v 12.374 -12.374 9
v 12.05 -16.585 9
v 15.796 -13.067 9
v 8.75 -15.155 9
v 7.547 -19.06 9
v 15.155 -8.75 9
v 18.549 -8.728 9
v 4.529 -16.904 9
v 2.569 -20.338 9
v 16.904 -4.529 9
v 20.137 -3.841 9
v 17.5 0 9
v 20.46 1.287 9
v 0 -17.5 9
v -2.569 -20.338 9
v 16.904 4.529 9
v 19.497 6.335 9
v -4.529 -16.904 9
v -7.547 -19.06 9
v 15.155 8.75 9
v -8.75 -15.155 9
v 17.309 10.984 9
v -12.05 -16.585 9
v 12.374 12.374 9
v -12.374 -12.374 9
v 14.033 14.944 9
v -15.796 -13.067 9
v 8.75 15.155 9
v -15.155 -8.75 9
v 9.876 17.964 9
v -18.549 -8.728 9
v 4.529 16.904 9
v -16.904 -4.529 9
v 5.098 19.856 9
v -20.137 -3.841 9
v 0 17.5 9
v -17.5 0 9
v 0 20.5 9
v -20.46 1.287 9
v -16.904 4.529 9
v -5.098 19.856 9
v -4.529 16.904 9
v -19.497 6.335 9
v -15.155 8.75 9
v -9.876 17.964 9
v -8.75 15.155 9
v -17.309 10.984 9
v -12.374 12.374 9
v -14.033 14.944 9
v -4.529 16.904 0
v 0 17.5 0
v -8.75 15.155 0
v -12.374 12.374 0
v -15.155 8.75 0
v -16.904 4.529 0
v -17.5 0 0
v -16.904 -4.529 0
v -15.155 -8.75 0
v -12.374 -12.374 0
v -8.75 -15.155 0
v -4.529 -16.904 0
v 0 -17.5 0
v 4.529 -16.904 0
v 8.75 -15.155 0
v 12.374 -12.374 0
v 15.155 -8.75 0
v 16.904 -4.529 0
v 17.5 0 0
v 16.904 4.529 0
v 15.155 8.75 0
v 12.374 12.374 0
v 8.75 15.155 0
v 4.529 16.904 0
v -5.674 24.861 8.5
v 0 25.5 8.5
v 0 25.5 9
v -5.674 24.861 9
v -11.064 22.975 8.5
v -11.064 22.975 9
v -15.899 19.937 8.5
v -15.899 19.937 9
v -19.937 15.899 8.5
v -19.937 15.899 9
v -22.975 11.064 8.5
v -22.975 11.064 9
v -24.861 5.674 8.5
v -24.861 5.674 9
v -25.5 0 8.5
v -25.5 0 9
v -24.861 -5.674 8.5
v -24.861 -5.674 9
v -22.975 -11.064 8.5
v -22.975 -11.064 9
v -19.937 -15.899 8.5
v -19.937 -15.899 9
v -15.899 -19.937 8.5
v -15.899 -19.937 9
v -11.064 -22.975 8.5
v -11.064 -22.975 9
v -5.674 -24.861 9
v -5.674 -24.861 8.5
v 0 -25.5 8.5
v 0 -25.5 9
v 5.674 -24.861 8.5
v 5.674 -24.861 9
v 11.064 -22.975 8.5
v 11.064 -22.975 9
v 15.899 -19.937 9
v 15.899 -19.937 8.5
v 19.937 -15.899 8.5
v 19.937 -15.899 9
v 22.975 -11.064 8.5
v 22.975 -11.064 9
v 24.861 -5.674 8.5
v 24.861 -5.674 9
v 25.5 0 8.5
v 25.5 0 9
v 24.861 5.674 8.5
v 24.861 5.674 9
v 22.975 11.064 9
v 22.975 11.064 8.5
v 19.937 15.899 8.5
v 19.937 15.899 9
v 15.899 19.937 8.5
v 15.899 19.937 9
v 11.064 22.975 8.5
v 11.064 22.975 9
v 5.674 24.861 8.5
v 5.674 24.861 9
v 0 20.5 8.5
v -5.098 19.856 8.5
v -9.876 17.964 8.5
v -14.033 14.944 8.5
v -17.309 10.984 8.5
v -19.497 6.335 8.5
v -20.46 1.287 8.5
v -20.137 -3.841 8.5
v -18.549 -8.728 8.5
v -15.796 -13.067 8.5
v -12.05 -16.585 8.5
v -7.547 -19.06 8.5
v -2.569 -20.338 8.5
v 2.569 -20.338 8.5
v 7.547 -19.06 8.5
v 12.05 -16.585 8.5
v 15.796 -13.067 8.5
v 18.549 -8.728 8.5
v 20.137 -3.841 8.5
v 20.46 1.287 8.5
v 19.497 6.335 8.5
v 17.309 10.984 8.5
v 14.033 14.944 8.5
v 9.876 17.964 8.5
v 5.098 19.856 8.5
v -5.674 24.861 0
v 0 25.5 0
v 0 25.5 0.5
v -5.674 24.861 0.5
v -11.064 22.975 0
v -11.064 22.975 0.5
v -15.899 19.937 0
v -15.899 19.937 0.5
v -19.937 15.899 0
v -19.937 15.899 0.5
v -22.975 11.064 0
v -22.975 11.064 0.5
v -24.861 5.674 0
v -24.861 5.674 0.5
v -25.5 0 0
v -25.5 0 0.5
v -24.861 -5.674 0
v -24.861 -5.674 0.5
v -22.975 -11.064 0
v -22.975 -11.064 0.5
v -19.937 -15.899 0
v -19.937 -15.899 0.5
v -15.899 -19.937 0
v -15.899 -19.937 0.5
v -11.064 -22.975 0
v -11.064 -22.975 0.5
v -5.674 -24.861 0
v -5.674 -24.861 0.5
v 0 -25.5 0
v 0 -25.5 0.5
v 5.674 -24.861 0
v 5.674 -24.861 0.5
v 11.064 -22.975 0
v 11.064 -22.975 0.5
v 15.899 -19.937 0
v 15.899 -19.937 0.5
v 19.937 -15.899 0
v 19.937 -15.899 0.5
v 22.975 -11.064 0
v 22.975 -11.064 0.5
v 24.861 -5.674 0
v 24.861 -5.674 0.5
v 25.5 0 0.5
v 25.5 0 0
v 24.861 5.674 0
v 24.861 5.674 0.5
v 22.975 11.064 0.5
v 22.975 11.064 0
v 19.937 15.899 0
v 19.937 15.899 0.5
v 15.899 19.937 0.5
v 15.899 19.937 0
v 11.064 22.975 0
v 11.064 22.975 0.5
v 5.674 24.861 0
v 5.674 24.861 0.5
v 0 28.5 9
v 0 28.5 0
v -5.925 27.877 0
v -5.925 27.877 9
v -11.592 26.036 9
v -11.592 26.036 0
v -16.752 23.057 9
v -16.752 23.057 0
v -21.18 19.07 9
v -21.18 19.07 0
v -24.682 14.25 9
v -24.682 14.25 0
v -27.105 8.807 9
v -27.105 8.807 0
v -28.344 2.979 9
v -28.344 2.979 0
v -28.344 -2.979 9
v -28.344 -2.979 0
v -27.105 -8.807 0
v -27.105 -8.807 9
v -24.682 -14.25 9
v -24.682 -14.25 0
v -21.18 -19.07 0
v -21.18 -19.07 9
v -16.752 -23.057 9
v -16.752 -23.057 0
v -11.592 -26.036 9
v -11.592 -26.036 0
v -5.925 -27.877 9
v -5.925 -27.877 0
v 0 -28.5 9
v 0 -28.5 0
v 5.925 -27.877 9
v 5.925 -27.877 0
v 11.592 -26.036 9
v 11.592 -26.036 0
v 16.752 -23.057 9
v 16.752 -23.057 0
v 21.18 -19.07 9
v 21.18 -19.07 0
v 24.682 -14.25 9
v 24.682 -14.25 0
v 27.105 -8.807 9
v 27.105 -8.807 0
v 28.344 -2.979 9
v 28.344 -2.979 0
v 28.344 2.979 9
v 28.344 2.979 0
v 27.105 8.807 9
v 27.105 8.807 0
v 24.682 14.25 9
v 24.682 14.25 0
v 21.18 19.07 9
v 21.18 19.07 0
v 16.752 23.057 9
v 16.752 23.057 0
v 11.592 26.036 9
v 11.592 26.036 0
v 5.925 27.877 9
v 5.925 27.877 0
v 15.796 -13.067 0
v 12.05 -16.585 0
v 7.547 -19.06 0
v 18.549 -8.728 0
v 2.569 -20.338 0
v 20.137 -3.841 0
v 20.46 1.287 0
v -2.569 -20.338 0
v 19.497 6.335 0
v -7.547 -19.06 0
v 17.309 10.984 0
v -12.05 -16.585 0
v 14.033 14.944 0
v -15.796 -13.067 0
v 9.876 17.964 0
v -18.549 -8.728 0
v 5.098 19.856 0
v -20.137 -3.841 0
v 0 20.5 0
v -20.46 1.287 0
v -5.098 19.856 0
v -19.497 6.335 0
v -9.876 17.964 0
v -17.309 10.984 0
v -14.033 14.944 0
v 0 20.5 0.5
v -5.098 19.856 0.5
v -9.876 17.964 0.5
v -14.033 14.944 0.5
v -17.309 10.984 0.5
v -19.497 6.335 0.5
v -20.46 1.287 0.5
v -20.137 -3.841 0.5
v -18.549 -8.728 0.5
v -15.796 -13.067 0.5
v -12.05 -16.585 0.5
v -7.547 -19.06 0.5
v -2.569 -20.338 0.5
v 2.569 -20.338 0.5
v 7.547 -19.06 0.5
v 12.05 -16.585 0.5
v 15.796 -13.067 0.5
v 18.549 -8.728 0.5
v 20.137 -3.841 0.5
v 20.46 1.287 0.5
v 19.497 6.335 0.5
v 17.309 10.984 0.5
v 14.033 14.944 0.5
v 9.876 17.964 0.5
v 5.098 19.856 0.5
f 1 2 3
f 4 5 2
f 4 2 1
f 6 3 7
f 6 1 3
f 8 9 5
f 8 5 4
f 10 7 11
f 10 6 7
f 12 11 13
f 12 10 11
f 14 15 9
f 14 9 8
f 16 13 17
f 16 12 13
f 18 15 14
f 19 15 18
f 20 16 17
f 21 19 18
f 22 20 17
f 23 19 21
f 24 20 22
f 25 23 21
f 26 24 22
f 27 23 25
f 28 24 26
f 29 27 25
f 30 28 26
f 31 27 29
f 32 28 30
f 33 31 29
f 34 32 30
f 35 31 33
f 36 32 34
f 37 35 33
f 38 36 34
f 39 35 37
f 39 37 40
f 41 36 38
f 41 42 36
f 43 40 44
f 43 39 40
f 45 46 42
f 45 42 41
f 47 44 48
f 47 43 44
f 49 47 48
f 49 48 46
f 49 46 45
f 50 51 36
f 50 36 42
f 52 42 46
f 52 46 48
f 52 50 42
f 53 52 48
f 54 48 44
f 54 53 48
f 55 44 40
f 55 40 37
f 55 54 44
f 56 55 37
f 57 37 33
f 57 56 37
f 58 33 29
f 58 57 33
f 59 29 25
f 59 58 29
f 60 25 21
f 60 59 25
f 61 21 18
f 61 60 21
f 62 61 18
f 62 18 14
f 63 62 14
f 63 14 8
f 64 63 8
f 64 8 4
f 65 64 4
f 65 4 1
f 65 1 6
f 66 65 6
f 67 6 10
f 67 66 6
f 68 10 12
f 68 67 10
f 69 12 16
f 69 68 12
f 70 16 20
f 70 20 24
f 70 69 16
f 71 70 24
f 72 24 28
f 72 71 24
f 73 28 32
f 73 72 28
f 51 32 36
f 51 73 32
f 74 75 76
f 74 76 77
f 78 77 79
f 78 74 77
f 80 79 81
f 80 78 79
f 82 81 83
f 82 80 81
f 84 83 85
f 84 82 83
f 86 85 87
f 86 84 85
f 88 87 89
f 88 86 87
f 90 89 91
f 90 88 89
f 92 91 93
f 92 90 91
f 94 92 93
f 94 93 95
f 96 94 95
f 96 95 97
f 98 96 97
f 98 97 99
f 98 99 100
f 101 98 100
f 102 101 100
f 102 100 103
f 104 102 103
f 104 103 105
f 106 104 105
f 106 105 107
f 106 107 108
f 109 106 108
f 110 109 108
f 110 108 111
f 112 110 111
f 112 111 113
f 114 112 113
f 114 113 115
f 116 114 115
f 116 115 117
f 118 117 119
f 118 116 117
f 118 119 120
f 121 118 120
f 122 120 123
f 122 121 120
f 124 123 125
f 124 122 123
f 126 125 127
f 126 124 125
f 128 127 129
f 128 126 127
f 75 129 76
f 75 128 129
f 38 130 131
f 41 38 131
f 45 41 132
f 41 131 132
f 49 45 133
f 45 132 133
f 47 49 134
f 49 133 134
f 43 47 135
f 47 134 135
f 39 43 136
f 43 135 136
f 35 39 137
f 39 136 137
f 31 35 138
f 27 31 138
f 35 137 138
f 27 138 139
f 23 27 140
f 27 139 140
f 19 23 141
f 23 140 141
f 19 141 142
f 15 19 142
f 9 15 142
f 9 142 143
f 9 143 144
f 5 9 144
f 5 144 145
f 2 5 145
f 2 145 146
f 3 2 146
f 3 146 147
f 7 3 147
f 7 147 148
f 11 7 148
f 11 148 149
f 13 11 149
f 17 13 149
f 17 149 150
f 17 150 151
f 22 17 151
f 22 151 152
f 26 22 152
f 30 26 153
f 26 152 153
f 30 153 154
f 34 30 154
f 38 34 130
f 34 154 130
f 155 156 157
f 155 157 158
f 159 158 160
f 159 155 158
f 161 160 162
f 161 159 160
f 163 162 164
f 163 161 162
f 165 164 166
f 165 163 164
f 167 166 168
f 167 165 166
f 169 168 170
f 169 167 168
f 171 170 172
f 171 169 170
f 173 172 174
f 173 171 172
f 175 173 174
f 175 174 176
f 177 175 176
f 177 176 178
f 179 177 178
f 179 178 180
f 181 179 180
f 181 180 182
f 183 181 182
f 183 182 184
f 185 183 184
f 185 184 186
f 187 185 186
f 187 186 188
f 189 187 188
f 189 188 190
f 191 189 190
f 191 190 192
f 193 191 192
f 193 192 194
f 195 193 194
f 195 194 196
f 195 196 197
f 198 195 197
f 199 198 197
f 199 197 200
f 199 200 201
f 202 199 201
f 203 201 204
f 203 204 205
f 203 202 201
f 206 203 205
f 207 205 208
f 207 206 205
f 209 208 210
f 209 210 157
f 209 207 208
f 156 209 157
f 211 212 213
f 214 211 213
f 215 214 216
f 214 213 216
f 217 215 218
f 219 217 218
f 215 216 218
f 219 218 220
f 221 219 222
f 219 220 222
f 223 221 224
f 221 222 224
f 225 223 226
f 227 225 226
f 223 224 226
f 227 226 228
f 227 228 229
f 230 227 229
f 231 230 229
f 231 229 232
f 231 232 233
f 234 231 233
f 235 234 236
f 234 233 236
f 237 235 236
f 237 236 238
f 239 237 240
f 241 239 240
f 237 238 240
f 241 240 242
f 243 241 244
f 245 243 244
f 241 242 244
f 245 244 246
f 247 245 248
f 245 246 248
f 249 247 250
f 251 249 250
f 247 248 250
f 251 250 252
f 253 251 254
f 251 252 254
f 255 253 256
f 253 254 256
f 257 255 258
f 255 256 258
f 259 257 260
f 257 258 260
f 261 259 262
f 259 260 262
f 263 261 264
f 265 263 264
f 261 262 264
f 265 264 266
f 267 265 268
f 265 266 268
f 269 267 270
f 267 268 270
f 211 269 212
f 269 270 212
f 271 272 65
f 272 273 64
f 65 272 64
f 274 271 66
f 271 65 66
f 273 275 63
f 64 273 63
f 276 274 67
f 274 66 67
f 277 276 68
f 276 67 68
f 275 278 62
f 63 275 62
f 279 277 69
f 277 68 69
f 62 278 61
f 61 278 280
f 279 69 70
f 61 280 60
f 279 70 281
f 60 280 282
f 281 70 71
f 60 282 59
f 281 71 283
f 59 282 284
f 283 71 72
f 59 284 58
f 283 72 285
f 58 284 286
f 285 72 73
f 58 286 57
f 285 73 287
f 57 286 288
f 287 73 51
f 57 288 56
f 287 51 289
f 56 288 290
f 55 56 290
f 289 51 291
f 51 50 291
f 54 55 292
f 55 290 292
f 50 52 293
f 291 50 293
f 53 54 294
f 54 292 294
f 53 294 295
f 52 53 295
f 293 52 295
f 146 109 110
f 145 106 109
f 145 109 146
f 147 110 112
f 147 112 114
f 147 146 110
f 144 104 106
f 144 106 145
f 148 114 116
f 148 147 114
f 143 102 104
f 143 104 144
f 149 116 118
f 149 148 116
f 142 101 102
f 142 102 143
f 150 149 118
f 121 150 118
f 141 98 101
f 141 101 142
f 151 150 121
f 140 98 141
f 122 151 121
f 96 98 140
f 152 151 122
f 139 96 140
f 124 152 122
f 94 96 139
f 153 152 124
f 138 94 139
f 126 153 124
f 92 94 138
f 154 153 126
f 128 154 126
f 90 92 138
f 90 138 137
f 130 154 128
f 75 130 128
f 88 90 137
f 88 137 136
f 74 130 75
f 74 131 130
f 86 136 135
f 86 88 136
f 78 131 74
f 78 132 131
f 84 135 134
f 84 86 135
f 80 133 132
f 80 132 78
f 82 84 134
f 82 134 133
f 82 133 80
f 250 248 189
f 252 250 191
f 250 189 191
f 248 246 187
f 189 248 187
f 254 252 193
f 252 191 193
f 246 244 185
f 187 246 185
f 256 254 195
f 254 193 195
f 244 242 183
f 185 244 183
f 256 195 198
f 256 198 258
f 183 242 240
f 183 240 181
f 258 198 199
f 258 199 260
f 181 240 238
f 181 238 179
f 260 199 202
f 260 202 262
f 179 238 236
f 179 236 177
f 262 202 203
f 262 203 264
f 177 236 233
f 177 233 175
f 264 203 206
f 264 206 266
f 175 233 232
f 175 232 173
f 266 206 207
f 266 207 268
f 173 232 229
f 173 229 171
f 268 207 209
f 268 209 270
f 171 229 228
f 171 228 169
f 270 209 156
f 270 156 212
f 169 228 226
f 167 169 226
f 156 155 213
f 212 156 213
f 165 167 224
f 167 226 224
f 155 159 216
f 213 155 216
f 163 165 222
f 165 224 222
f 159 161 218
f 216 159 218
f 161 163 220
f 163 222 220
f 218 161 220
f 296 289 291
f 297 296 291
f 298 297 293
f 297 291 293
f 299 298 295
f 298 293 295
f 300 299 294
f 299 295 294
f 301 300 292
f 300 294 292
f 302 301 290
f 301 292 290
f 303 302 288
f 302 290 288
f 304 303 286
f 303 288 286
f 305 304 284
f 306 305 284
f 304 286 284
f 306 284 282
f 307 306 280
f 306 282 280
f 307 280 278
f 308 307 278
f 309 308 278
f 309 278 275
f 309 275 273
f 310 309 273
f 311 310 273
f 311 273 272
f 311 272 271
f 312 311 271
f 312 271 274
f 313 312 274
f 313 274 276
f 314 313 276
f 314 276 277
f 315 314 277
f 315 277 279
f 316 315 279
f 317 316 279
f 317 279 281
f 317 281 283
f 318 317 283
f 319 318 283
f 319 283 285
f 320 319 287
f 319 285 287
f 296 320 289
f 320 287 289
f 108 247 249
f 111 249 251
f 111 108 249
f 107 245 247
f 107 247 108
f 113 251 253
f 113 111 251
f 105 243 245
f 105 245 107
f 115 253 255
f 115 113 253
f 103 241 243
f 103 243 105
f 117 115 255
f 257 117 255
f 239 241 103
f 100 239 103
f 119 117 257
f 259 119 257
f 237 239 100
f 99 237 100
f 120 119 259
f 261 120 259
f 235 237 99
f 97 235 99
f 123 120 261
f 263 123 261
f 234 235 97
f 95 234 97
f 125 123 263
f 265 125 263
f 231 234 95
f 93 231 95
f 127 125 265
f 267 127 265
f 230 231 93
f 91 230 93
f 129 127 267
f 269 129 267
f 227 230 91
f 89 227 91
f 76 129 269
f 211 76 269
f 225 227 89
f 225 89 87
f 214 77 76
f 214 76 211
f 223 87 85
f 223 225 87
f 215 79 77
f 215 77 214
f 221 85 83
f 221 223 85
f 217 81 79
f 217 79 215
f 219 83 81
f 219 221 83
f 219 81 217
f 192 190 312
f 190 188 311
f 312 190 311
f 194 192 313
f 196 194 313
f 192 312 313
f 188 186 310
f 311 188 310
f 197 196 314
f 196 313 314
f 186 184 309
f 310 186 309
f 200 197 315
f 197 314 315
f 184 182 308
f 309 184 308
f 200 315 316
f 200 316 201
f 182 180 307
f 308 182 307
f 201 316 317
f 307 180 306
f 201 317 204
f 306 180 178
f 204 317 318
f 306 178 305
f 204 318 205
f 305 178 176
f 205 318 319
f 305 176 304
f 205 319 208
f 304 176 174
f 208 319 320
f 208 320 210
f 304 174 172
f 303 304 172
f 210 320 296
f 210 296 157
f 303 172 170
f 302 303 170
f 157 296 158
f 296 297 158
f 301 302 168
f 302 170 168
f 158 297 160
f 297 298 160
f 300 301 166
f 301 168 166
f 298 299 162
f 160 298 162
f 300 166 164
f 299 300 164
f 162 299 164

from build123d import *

# Parameters (mm, degrees)
SKETCH1_R             = 28.5
SKETCH1_R_2           = 25.5
BOSS_EXTRUDE1_DEPTH   = 9
SKETCH1_R_3           = 20.5
SKETCH1_R_4           = 17.5
BOSS_EXTRUDE1_2_DEPTH = 9
BOSS_EXTRUDE2_START   = 0.5
SKETCH1_3_R           = 25.5
SKETCH1_3_R_2         = 20.5
BOSS_EXTRUDE2_DEPTH   = 8


with BuildPart() as part:
    # Sketch1 → Boss-Extrude1 (new body)
    with BuildSketch(Plane(origin=(0, 0, 0), x_dir=(0, 1, 0), z_dir=(0, 0, 1))):
        Circle(SKETCH1_R)
        Circle(SKETCH1_R_2, mode=Mode.SUBTRACT)
    extrude(amount=BOSS_EXTRUDE1_DEPTH)



with BuildPart() as body_2:
    # Sketch1 → Boss-Extrude1 2 (new body)
    with BuildSketch(Plane(origin=(0, 0, 0), x_dir=(0, 1, 0), z_dir=(0, 0, 1))):
        Circle(SKETCH1_R_3)
        Circle(SKETCH1_R_4, mode=Mode.SUBTRACT)
    extrude(amount=BOSS_EXTRUDE1_2_DEPTH)


with BuildPart() as part_1:
    add(part.part)

    add(body_2.part)  # Boss-Extrude2 merges body 2
    # Sketch1<3> → Boss-Extrude2 (add)
    with BuildSketch(Plane(origin=(0, 0, 0), x_dir=(0, 1, 0), z_dir=(0, 0, 1)).offset(BOSS_EXTRUDE2_START)):
        Circle(SKETCH1_3_R)
        Circle(SKETCH1_3_R_2, mode=Mode.SUBTRACT)
    extrude(amount=BOSS_EXTRUDE2_DEPTH)


solid = part_1.part
